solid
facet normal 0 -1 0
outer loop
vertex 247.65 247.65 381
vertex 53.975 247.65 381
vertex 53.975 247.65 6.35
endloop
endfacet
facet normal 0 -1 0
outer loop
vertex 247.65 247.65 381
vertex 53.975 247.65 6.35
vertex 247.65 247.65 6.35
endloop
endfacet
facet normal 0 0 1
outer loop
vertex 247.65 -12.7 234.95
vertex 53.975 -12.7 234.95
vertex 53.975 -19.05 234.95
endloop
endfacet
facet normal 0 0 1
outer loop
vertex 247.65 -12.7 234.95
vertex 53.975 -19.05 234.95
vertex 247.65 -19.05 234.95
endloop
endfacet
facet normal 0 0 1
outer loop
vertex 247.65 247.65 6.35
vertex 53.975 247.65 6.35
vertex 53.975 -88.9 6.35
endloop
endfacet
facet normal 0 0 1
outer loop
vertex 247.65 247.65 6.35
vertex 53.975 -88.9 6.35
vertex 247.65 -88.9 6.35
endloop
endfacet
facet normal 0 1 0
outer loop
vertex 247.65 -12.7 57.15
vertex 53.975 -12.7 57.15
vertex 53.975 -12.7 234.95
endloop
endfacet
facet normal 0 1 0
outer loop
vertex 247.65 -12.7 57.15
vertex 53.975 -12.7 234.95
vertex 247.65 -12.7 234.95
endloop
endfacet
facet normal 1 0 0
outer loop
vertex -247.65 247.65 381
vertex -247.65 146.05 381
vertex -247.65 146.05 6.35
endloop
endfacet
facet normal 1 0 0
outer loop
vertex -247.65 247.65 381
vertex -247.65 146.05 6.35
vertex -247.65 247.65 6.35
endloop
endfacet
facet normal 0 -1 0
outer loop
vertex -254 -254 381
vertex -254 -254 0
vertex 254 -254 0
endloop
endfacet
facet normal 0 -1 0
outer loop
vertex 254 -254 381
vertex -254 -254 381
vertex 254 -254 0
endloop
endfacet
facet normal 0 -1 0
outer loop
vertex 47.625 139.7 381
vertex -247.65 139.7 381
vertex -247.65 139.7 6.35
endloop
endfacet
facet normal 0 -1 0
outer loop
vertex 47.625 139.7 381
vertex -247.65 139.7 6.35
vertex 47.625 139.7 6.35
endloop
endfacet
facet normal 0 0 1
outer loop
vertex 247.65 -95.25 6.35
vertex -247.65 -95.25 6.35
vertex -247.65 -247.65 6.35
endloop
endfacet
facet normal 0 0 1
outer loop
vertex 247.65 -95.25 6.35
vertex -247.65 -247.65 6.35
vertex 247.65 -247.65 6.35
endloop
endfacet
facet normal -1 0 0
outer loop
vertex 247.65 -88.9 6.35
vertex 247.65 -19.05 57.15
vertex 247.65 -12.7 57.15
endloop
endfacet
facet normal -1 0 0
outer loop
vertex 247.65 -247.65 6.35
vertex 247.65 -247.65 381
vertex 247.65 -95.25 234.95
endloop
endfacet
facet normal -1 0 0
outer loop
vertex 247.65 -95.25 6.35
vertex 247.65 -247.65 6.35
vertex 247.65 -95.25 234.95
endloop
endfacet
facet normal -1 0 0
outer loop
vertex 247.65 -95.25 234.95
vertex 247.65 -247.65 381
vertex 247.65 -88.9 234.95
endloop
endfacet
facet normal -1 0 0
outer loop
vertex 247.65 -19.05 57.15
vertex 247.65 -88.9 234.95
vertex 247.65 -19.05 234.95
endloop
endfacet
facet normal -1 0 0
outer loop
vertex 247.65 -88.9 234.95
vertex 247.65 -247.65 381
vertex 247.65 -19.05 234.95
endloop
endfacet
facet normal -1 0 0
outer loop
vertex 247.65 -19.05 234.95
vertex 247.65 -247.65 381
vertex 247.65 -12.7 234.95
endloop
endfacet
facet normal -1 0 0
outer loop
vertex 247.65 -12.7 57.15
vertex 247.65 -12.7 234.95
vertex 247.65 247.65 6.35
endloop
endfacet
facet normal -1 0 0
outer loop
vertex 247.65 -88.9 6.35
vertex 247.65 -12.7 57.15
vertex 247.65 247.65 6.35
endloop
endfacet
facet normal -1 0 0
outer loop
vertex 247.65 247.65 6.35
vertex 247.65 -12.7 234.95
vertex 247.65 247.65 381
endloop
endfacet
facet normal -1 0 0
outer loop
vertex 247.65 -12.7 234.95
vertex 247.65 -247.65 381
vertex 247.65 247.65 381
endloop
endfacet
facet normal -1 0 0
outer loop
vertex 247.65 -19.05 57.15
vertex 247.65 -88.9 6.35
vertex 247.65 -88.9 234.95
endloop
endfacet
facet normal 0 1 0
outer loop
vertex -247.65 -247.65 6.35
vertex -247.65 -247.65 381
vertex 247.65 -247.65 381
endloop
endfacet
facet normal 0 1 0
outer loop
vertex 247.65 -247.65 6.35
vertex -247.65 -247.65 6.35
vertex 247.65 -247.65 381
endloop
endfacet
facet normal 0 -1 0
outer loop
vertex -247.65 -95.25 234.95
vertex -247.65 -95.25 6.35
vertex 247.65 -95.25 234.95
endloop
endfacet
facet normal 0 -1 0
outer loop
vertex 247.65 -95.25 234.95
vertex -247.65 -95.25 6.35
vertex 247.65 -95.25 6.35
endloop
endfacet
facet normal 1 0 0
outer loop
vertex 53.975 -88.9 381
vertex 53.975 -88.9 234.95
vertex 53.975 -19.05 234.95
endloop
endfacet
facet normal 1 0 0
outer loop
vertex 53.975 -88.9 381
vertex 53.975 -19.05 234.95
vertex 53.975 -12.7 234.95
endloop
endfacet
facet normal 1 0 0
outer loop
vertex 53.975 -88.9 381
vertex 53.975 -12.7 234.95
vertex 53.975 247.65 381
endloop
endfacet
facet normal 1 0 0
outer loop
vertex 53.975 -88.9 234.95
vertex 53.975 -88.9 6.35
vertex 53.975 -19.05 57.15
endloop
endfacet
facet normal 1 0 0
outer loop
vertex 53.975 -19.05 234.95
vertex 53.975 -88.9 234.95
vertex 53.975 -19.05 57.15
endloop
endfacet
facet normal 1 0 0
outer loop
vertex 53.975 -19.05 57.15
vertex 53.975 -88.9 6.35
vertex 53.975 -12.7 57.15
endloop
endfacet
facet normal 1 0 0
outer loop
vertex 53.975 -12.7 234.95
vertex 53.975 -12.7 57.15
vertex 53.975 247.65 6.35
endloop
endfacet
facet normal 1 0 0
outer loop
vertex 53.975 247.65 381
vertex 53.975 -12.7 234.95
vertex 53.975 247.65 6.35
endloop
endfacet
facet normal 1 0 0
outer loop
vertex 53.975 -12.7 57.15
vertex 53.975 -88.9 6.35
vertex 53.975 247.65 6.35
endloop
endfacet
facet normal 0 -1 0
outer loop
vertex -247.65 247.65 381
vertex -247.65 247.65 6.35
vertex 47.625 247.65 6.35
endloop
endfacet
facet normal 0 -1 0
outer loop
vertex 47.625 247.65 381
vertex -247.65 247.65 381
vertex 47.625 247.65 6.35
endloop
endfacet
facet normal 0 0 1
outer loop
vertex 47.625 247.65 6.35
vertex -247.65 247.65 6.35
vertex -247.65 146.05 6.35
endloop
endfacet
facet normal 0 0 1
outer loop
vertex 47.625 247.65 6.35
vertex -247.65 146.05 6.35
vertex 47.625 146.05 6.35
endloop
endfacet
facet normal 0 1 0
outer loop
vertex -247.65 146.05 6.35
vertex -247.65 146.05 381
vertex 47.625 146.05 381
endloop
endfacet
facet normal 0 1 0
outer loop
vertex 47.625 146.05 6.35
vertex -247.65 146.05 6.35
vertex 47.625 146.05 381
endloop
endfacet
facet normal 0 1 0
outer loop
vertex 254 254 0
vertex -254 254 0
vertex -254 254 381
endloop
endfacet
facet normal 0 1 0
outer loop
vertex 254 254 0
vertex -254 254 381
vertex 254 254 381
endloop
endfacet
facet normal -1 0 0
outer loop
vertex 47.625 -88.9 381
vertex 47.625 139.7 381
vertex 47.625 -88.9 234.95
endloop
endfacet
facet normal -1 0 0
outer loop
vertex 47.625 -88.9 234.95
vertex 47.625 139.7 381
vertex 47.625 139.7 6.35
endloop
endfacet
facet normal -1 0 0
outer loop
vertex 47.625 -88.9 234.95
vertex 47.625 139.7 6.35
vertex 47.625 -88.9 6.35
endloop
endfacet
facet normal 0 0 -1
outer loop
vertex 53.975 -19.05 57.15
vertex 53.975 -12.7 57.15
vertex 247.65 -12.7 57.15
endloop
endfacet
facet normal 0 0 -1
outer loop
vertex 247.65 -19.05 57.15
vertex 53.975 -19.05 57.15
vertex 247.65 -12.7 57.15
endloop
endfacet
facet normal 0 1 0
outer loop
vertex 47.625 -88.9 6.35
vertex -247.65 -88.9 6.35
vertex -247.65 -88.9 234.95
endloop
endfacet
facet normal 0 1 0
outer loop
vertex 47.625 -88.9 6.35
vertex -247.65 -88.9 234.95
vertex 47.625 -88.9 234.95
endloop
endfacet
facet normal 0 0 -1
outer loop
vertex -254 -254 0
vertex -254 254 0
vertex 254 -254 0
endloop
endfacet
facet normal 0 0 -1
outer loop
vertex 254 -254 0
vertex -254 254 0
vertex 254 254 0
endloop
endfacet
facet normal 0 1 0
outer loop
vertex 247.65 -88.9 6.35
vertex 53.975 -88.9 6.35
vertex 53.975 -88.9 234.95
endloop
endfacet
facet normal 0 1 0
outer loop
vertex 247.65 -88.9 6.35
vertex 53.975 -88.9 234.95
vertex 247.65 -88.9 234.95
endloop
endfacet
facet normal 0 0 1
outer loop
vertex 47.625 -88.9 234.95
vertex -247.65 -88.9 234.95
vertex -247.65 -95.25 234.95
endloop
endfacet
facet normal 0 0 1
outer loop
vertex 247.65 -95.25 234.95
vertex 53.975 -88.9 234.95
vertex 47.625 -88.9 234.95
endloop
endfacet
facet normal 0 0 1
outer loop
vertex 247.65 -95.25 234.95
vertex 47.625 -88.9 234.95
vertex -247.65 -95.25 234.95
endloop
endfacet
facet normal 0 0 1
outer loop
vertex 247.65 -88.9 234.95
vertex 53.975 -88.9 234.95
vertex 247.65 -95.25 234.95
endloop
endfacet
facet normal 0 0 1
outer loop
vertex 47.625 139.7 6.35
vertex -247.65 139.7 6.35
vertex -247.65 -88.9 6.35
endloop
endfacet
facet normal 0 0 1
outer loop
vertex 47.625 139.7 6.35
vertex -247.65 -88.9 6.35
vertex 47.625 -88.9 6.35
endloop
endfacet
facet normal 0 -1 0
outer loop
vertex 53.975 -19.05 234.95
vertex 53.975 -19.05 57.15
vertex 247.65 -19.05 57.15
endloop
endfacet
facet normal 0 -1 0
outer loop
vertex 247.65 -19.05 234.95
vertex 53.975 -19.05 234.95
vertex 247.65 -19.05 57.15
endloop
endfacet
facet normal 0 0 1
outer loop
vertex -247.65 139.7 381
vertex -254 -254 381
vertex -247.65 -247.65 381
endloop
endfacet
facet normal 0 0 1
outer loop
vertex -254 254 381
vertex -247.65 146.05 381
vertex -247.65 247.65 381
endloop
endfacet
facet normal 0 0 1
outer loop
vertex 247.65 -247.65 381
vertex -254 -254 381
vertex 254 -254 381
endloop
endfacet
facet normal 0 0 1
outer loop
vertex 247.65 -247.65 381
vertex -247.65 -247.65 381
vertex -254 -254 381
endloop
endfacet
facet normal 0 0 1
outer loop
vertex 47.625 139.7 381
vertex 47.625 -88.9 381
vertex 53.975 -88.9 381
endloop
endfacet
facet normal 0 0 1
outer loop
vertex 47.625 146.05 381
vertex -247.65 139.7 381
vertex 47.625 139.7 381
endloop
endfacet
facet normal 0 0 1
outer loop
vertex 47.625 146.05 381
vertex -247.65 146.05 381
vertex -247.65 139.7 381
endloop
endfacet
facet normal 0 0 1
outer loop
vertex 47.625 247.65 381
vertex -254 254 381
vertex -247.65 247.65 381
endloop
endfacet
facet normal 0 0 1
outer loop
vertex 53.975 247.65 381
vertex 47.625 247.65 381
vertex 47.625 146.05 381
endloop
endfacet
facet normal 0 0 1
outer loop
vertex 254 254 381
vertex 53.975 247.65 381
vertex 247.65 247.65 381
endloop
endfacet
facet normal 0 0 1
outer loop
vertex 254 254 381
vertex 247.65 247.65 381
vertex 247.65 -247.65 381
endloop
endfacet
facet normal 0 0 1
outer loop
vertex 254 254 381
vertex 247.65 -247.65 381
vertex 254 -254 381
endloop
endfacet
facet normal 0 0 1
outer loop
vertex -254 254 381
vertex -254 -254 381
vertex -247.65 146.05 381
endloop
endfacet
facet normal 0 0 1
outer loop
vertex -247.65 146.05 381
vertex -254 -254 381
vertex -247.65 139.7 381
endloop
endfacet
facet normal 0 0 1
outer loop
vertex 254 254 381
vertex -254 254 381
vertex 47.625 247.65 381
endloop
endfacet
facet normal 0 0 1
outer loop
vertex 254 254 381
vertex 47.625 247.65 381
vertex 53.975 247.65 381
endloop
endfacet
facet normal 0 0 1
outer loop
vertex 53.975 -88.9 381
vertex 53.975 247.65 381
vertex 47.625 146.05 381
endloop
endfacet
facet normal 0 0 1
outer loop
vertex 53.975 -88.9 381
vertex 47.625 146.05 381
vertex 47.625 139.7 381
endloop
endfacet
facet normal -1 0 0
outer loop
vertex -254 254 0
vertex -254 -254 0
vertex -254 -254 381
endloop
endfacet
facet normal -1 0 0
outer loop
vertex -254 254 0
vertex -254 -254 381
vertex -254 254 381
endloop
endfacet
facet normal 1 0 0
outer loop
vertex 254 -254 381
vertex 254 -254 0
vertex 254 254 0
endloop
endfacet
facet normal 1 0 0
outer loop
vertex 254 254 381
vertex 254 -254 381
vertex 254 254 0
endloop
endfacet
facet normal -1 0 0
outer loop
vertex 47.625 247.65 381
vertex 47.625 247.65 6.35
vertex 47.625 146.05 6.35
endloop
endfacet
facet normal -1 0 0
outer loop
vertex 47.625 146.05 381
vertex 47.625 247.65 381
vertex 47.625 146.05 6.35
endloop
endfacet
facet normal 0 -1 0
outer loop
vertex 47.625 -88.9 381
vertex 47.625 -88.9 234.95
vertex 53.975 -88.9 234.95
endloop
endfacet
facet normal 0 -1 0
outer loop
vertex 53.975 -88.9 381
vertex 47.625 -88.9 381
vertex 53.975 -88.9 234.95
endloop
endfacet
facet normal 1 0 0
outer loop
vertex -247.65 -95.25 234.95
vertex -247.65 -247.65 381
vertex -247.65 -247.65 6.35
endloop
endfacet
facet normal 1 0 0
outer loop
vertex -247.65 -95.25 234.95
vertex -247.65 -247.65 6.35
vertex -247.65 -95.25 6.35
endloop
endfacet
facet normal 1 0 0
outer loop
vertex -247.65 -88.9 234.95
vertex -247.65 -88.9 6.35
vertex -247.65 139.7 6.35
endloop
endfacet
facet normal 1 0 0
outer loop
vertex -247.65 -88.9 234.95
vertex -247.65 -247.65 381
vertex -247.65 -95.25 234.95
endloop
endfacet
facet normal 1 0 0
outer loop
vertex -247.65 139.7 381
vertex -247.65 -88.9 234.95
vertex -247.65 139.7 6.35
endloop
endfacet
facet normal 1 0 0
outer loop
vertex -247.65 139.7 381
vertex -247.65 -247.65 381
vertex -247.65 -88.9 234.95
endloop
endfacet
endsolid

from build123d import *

# Parameters (mm, degrees)
F0_W      = 508
F0_H      = 508
F1_DEPTH  = 381
F2_W      = 495.299994
F2_H      = 495.299994
F3_DEPTH  = 374.65
F4_W      = 495.299994
F4_H      = 6.349997
F5_DEPTH  = 228.6
F6_W      = 193.675
F6_H      = 6.35
F7_DEPTH  = 228.6
F8_DEPTH  = 374.65
F6_W_2    = 295.274994
F6_H_2    = 6.350006
F9_DEPTH  = 374.65
F10_DEPTH = 50.8


with BuildPart() as f1:
    # F0 (on Top) → F1 (new body)
    with BuildSketch(Plane.XY):
        Rectangle(F0_W, F0_H)
    extrude(amount=F1_DEPTH)

    # F2 (on face) → F3 (cut)
    with BuildSketch(Plane.XY.offset(381)):
        Rectangle(F2_W, F2_H)
    extrude(amount=-F3_DEPTH, mode=Mode.SUBTRACT)

    # F4 (on face) → F5 (join)
    with BuildSketch(Plane.XY.offset(6.35)):
        with Locations((0, -92.074998)):
            Rectangle(F4_W, F4_H)
    extrude(amount=F5_DEPTH)

    # F6 (on face) → F7 (join)
    with BuildSketch(Plane.XY.offset(6.35)):
        with Locations((150.812497, -15.875003)):
            Rectangle(F6_W, F6_H)
    extrude(amount=F7_DEPTH)

    # F6 (on face) → F8 (join)
    with BuildSketch(Plane.XY.offset(6.35)):
        Polygon((53.974997, -12.700003), (53.974997, 247.649997), (47.624997, 247.649997), (47.624997, 146.050006), (47.624997, 139.7), (47.624997, -88.9), (53.974997, -88.9), (53.974997, -19.050003), align=None)
    extrude(amount=F8_DEPTH)

    # F6 (on face) → F9 (join)
    with BuildSketch(Plane.XY.offset(6.35)):
        with Locations((-100.0125, 142.875003)):
            Rectangle(F6_W_2, F6_H_2)
    extrude(amount=F9_DEPTH)

    # F6 (on face) → F10 (cut)
    with BuildSketch(Plane.XY.offset(6.35)):
        with Locations((150.812497, -15.875003)):
            Rectangle(F6_W, F6_H)
    extrude(amount=F10_DEPTH, mode=Mode.SUBTRACT)


solid = f1.part
